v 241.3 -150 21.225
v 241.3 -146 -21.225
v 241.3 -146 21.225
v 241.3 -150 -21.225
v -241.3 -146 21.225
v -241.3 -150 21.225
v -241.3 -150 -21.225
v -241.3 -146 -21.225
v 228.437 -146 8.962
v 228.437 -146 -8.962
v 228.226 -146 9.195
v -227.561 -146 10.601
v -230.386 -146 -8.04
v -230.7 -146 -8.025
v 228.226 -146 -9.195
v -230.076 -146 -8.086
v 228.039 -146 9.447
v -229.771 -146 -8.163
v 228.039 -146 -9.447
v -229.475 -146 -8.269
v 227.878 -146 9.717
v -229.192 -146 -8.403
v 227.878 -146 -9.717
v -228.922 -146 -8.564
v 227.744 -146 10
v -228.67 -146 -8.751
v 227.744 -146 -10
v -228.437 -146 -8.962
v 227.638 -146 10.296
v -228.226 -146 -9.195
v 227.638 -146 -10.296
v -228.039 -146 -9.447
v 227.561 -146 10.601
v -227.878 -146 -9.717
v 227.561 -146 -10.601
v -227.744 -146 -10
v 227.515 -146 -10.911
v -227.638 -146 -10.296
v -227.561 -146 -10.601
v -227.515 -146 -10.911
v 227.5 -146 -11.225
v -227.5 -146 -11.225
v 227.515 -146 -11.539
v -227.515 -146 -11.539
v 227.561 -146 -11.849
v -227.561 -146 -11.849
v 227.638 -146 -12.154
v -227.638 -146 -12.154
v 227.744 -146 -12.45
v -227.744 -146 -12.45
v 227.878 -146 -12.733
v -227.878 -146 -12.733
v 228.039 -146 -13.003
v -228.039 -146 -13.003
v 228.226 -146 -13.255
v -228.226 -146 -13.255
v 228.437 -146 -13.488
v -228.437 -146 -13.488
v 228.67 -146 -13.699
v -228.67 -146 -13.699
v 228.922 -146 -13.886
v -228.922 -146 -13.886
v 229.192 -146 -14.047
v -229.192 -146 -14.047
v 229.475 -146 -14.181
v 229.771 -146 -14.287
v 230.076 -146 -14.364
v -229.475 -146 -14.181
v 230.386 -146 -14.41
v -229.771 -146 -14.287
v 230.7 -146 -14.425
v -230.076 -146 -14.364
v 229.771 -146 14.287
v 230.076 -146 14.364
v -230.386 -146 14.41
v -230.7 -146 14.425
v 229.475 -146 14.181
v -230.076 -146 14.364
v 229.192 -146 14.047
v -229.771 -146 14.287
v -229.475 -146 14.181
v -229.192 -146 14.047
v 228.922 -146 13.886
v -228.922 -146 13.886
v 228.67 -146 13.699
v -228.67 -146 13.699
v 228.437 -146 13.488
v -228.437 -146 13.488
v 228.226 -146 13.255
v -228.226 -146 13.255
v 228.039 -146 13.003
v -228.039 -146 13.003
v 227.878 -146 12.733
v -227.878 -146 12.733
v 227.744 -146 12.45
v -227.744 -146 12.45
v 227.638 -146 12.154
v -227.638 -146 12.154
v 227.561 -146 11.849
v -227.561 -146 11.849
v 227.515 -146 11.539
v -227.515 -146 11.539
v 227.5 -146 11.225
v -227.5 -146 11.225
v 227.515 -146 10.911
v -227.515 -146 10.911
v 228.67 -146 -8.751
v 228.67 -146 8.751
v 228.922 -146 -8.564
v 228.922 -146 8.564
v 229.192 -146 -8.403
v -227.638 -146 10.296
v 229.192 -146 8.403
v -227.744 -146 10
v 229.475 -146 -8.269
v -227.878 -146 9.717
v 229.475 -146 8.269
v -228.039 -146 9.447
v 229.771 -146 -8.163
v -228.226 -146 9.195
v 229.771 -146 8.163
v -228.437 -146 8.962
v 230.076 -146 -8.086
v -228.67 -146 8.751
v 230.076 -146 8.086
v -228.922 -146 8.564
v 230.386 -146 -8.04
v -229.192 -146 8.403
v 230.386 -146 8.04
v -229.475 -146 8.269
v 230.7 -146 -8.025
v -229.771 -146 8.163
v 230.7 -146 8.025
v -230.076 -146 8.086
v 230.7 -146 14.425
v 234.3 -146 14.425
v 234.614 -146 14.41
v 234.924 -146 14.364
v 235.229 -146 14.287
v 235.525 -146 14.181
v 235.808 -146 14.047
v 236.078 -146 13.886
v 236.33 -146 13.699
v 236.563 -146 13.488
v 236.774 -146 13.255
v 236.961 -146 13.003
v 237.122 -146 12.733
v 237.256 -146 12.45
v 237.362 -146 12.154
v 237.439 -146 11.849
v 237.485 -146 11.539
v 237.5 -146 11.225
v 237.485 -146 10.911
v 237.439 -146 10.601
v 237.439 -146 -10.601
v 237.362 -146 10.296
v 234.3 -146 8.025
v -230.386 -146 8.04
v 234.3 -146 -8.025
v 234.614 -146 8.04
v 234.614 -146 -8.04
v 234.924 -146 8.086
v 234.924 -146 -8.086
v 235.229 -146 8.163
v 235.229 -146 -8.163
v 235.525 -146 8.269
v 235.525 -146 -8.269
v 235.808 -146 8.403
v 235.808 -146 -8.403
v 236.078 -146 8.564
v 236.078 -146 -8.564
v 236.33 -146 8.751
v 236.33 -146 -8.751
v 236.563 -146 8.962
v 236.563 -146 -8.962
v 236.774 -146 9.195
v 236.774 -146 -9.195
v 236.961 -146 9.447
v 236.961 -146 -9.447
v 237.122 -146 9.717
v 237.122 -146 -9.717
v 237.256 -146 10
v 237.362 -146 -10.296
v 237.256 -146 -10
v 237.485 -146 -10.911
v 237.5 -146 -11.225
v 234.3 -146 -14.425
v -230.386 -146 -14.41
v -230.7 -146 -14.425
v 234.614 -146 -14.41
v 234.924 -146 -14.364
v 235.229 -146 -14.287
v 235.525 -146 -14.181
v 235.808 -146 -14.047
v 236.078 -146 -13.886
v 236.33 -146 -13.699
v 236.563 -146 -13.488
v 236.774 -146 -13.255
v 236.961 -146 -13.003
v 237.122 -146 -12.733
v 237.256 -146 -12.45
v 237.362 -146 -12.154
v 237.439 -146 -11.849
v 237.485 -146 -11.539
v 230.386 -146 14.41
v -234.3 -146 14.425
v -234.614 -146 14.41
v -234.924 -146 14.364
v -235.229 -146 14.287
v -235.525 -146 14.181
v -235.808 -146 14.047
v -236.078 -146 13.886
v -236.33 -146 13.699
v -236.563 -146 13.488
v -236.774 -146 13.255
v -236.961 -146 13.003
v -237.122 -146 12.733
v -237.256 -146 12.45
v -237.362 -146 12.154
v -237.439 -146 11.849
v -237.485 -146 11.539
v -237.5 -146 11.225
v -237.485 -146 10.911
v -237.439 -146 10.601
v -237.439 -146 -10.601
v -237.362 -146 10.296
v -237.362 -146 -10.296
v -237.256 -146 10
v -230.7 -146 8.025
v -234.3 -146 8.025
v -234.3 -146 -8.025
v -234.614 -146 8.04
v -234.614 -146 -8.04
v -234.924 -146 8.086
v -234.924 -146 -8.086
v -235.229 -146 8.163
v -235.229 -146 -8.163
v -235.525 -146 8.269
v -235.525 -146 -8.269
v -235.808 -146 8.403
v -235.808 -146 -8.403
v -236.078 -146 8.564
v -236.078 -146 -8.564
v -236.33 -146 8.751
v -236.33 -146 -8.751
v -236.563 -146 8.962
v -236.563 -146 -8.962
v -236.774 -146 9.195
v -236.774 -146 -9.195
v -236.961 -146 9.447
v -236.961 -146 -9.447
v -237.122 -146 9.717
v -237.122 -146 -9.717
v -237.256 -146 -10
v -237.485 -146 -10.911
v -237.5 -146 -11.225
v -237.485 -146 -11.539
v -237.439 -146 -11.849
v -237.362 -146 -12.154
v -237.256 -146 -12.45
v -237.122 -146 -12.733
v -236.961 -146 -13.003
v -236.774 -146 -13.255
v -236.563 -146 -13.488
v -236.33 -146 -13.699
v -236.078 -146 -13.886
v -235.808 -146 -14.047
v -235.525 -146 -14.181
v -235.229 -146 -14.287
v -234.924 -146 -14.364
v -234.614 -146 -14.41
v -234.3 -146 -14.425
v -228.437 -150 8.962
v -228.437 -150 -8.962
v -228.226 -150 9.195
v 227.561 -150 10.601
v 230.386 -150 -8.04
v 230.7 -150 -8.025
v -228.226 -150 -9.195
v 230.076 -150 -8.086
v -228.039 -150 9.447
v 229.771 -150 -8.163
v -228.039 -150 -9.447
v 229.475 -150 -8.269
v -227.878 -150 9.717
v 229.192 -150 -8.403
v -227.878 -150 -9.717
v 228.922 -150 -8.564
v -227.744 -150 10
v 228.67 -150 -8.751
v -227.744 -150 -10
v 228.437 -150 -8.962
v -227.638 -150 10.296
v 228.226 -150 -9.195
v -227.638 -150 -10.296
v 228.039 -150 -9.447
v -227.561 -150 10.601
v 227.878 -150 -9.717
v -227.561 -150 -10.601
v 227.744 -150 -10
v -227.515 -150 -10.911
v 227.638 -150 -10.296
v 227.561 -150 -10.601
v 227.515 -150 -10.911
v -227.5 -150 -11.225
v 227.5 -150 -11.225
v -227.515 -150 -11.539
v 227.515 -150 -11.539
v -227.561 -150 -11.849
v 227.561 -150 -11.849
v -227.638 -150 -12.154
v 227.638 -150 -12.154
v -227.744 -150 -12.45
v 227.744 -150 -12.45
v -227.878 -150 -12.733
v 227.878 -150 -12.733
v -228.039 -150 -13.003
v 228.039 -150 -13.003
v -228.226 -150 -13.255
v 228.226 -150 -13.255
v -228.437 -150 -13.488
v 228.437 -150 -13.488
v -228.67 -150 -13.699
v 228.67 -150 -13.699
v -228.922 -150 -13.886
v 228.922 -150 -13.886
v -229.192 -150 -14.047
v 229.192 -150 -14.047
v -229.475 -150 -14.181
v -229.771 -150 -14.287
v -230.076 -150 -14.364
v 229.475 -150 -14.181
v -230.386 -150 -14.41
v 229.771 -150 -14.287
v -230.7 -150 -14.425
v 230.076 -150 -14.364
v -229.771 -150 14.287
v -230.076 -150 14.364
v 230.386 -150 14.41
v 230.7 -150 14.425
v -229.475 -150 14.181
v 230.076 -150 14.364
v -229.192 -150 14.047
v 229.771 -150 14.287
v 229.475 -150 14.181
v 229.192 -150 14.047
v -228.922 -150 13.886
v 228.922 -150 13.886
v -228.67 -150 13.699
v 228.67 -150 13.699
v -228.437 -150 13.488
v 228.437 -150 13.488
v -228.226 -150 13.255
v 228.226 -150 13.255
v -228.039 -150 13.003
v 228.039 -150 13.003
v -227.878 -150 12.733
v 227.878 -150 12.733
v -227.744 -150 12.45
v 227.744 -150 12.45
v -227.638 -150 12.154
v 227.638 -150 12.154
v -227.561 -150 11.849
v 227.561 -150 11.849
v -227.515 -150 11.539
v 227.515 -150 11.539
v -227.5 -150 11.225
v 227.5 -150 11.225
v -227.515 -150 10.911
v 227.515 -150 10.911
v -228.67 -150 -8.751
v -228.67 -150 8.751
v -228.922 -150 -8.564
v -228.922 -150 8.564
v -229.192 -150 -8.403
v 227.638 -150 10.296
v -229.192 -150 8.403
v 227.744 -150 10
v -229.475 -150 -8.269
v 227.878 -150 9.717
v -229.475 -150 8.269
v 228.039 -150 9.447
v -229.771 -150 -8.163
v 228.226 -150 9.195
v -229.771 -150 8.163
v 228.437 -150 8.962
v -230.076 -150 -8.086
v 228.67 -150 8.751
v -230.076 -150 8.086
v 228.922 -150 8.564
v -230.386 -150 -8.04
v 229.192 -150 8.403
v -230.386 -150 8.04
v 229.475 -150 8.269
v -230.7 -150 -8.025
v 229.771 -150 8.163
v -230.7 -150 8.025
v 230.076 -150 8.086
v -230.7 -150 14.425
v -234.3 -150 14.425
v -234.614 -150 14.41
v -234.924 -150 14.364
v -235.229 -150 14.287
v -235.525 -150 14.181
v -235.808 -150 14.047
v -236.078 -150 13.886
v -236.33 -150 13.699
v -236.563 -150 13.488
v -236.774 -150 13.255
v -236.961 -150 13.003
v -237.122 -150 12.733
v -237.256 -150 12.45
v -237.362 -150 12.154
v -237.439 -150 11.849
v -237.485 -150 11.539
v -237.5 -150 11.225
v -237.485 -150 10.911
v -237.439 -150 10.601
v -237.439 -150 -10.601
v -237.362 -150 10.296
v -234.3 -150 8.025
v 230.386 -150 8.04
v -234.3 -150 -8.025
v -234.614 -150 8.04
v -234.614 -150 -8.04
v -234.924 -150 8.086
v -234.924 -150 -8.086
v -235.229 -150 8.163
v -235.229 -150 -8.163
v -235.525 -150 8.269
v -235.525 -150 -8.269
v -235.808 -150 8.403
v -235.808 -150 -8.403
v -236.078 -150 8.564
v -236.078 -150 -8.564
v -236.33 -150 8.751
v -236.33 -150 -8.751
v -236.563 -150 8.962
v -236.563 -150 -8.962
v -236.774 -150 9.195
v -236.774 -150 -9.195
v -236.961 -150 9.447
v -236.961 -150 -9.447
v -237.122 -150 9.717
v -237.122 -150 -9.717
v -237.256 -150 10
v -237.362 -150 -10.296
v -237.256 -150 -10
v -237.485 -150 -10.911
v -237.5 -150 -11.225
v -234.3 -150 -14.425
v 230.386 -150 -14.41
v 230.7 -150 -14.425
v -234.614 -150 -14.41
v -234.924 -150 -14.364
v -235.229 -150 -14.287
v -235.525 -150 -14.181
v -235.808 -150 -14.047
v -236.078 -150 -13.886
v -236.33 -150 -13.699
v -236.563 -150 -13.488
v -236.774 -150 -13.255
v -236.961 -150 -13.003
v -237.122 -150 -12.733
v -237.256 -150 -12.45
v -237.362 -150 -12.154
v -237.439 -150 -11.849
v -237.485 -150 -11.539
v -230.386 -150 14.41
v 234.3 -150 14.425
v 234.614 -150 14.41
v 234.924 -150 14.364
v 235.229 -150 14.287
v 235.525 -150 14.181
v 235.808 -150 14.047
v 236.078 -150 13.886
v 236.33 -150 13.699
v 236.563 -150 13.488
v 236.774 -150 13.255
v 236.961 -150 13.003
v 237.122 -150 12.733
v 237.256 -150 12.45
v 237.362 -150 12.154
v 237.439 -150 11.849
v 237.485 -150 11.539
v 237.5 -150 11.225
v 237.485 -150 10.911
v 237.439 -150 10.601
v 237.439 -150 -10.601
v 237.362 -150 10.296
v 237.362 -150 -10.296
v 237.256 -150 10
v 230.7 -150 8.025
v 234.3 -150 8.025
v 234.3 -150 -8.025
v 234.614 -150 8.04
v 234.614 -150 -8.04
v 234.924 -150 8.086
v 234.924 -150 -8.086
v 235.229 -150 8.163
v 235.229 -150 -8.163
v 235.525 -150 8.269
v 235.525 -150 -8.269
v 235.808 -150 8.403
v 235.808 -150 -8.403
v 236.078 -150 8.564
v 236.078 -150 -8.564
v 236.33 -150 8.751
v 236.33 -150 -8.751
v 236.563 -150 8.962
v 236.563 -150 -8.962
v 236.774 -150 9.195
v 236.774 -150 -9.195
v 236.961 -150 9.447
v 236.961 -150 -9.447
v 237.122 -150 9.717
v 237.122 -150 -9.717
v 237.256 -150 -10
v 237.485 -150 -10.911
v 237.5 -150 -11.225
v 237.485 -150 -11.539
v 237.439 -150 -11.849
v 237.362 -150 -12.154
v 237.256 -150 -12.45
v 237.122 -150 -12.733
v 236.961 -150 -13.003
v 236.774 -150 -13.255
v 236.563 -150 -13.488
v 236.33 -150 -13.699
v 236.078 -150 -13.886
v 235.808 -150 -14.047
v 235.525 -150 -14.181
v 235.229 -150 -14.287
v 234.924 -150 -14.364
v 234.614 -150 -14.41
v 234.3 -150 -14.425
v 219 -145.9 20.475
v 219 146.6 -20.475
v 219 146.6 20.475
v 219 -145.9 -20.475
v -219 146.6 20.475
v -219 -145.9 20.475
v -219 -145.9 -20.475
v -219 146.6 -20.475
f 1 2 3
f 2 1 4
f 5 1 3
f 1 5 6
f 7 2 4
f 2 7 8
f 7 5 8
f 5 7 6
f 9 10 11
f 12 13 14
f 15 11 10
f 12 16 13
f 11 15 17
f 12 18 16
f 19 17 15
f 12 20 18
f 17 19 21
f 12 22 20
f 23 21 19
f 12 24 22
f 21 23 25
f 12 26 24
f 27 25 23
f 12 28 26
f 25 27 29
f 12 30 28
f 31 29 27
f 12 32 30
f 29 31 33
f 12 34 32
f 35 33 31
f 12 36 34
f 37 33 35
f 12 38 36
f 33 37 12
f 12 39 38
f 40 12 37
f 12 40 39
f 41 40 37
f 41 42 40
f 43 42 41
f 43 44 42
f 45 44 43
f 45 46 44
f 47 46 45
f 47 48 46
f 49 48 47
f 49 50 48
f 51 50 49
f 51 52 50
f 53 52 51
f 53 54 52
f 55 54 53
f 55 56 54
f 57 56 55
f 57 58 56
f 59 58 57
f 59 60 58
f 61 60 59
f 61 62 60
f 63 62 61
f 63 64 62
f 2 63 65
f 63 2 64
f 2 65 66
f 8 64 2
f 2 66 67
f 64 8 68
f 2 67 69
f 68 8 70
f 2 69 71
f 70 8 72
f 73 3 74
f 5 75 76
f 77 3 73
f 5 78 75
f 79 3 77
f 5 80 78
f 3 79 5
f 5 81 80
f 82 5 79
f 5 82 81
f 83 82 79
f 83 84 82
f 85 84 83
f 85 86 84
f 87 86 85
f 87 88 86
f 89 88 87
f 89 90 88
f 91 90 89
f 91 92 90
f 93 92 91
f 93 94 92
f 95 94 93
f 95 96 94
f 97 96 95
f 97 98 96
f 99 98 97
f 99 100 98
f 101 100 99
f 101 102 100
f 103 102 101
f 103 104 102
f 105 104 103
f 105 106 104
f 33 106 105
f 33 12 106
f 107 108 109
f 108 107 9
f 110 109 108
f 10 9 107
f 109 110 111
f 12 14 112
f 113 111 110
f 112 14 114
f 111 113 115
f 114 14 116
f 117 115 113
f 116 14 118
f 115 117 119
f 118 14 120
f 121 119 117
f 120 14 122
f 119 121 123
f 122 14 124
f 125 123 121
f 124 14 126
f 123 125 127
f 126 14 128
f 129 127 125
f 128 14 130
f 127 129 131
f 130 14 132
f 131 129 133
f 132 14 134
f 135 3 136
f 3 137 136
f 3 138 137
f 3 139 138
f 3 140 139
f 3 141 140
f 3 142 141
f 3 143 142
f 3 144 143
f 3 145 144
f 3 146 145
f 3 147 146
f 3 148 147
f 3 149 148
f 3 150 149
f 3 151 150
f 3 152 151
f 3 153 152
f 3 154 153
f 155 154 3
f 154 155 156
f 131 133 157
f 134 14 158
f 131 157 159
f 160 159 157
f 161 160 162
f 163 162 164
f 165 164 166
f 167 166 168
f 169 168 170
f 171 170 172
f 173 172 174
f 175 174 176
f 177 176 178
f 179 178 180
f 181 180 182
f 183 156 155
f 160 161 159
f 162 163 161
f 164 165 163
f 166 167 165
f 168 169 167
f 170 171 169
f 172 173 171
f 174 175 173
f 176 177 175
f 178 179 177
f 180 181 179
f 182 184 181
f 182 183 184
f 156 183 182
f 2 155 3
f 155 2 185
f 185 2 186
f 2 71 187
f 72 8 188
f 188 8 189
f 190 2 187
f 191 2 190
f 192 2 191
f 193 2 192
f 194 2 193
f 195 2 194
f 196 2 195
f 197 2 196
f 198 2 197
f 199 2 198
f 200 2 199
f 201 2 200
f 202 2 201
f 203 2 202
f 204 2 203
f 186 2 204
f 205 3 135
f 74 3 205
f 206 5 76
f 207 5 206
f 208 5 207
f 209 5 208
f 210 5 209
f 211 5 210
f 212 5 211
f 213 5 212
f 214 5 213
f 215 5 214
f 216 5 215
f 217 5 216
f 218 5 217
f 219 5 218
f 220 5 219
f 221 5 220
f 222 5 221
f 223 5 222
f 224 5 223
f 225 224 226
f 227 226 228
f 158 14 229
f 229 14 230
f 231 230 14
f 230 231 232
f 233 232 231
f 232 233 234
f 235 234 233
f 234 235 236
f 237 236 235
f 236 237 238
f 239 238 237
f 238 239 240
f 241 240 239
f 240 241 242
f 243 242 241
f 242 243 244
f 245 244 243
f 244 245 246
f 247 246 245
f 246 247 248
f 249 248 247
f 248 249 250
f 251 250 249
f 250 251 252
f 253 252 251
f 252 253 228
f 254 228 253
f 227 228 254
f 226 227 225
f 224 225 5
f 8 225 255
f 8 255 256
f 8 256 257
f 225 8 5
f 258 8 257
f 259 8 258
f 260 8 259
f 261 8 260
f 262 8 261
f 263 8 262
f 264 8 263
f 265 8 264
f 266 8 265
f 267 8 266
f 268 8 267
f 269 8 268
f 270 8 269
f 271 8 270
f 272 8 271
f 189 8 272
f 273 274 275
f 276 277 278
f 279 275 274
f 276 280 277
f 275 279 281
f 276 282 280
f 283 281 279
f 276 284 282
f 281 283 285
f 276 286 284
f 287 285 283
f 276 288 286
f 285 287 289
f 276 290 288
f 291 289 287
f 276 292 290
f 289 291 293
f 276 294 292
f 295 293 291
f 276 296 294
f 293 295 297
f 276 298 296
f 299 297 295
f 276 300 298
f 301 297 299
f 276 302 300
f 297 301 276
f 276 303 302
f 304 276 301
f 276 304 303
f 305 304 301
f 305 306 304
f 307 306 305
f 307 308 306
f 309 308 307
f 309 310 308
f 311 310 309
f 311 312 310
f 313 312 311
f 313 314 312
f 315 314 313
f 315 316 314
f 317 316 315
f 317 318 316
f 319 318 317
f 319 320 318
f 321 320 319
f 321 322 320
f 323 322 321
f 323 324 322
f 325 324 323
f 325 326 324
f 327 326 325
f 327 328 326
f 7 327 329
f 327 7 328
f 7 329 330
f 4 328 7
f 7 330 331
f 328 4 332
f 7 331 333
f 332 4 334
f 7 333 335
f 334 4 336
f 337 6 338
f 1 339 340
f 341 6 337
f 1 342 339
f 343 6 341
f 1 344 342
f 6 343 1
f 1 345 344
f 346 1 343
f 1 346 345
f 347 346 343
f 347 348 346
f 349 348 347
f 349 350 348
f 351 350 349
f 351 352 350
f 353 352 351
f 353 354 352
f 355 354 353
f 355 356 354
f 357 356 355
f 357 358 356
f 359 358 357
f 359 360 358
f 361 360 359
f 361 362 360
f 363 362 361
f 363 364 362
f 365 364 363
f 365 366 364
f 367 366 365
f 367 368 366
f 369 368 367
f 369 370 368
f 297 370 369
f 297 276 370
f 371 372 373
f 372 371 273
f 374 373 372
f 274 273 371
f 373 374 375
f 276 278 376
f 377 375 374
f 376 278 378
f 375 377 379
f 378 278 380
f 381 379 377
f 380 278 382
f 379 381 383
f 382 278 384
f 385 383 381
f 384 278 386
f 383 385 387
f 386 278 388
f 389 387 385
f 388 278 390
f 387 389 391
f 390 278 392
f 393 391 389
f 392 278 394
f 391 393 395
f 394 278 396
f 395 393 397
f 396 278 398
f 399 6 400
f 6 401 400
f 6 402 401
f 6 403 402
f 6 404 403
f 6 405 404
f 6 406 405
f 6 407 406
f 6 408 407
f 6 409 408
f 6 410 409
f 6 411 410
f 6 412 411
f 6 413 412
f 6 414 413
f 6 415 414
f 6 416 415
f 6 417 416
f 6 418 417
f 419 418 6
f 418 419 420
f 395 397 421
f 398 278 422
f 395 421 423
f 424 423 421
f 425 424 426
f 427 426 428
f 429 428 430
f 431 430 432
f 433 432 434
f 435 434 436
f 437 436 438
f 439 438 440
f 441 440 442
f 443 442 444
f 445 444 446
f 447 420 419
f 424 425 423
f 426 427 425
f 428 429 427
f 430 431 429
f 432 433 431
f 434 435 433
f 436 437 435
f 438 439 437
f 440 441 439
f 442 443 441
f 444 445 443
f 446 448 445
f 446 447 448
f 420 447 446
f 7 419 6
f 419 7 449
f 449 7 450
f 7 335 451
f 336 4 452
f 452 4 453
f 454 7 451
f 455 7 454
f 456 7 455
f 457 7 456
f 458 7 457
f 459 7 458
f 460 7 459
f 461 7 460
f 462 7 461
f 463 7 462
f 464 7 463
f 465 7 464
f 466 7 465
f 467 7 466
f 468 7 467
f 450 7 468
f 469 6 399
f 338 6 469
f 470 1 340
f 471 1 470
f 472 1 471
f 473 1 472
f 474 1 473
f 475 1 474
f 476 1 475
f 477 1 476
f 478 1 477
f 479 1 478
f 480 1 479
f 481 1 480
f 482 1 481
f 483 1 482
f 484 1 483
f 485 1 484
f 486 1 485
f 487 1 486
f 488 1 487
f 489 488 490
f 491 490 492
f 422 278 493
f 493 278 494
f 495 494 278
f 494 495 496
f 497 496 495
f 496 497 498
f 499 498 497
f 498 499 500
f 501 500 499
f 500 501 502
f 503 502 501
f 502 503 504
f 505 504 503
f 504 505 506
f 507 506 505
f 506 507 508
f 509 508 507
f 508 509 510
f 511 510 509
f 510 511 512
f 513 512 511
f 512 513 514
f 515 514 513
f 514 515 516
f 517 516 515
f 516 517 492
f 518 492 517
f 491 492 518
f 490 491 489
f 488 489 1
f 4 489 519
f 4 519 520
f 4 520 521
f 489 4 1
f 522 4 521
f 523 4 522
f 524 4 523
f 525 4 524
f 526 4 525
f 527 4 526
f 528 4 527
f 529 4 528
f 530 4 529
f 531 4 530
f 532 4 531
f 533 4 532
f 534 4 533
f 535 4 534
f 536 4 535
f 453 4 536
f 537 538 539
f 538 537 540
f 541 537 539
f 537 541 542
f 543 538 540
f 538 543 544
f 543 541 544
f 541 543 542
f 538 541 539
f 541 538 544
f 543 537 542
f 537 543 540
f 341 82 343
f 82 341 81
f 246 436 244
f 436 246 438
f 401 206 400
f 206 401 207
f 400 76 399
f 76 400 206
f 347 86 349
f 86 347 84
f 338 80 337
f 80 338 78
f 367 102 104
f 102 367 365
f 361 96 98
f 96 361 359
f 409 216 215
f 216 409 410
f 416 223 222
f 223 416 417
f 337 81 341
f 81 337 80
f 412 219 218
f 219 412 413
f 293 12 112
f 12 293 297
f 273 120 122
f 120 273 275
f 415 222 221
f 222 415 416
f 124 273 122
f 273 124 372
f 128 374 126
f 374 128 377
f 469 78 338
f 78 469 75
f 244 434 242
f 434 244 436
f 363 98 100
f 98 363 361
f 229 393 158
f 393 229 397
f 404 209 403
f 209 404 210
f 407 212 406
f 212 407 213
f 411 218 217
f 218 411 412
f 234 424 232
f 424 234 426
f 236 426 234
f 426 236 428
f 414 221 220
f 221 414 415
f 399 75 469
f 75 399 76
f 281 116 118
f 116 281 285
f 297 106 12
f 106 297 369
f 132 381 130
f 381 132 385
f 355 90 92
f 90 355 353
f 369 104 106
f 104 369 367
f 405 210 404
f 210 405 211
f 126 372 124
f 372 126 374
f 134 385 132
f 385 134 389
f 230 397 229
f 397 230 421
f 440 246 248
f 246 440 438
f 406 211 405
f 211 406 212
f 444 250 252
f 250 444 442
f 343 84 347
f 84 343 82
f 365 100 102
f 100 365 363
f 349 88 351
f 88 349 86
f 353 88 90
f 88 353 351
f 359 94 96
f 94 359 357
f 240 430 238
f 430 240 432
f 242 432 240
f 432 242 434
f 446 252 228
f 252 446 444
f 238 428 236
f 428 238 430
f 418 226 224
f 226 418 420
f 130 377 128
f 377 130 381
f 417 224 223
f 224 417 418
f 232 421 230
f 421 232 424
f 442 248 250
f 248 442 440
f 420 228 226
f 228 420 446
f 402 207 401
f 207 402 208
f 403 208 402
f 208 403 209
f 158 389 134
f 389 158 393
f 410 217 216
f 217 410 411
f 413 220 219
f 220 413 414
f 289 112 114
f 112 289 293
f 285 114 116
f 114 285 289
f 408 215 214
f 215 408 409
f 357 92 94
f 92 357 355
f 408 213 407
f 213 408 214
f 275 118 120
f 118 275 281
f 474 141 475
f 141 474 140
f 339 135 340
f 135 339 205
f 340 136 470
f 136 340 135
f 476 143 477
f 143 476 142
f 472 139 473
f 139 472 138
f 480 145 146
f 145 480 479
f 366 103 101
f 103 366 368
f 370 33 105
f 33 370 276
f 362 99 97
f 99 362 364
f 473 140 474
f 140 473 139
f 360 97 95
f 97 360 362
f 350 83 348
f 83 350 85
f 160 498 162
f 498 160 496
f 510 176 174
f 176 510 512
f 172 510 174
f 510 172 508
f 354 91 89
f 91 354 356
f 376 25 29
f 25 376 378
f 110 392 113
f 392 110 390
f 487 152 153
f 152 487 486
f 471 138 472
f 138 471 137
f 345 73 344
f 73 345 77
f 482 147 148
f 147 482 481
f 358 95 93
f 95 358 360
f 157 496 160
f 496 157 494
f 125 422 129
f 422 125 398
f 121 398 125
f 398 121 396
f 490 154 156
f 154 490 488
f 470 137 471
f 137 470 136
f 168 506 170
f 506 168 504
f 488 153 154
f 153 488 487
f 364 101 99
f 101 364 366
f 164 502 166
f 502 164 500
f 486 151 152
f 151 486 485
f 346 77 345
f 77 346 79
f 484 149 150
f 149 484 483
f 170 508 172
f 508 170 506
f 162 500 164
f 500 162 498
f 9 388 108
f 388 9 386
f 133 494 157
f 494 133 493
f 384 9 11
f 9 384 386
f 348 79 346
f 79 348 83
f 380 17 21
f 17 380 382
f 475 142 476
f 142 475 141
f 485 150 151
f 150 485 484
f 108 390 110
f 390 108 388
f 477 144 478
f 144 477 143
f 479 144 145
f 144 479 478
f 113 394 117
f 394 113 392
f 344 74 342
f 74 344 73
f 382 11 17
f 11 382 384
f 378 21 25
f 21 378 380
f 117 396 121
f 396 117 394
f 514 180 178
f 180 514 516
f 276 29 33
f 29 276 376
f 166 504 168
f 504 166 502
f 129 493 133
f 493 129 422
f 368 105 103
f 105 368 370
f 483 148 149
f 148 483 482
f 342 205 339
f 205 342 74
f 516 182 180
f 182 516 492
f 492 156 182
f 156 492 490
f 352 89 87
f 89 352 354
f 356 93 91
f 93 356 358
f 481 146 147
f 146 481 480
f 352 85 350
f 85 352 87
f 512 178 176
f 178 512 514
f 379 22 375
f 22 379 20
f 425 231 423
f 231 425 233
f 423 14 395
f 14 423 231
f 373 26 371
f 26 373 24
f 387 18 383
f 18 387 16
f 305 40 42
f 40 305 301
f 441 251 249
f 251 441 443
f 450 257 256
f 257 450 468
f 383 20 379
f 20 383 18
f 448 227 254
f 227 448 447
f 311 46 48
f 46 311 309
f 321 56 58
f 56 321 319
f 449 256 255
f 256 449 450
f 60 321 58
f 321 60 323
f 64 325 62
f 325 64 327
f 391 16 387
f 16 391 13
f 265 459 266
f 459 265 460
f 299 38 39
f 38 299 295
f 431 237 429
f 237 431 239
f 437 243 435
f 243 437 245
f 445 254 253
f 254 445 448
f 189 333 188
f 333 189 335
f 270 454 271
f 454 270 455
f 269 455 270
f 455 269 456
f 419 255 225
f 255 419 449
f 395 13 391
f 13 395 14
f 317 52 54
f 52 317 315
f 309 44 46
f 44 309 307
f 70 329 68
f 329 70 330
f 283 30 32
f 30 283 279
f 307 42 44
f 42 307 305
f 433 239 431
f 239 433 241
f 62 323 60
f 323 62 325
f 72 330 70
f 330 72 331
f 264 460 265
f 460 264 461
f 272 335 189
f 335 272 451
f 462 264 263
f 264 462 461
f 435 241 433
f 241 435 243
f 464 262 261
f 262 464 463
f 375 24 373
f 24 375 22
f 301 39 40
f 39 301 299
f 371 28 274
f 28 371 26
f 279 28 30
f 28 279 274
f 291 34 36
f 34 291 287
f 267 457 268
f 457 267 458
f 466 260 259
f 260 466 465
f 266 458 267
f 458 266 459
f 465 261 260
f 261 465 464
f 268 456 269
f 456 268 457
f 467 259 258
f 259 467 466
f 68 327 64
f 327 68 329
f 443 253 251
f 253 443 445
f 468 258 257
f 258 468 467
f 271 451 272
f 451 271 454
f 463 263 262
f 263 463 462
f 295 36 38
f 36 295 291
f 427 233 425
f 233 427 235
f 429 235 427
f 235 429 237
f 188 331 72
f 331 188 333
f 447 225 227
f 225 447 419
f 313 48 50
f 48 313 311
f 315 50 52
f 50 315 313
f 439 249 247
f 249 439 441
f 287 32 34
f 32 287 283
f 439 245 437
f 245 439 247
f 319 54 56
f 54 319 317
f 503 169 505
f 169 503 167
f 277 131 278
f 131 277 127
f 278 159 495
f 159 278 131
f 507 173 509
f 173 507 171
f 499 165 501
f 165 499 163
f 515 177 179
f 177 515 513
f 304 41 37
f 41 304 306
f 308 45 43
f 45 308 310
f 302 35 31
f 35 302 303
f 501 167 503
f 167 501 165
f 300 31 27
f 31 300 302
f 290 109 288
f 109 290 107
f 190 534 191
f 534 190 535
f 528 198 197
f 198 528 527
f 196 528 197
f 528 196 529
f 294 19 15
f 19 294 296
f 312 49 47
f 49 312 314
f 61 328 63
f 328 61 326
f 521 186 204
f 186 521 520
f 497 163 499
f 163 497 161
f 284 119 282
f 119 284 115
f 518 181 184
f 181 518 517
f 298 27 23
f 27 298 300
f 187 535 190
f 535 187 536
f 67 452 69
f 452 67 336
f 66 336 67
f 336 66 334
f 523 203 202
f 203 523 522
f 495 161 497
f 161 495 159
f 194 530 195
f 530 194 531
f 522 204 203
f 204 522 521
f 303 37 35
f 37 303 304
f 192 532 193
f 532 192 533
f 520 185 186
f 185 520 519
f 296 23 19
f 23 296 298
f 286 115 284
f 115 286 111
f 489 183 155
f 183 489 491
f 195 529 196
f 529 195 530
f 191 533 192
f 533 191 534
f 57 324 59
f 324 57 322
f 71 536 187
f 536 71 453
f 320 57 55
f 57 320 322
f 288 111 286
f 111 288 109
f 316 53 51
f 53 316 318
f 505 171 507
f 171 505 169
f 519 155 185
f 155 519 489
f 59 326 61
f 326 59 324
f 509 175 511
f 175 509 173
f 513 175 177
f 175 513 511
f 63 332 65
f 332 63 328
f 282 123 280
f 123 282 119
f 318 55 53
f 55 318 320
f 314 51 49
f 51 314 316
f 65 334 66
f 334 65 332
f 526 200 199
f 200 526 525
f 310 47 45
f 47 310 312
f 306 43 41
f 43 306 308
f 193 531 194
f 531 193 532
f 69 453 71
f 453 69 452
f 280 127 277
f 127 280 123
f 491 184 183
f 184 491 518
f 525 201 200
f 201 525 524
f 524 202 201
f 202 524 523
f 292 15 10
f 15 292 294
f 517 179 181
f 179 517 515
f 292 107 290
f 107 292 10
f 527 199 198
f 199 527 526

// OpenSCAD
// ============================================================================
// Atom Lithography Machine — Parametric OpenSCAD Module (S3.3-02)
// ============================================================================
// part_id           : S3.3-02
// parent_bom_id     : S3.3
// subsystem         : S3
// part_name         : Yuksek hizli LVDS / optik galvanik izole blanker geri-besleme hatti
// material          : Al 6061
// temp_stage        : 300 K
// vacuum_grade      : Atmosfer
// tolerance         : Jitter <1 ns
// computed_mass_kg  : 2.44621
// envelope_mm       : 482.600 x 333.000 x 42.450
// design_maturity   : M0_M1_DETAILED_CAD_DESIGN_ONLY
// no_lab_measurement: true
// iec61508_certified: false
// semi_s2_certified : false
// Units: millimeters (mm)
// ============================================================================

$fn = 64;

// Nominal bounding envelope parameters (mm)
bbox_x = 482.6000;
bbox_y = 333.0000;
bbox_z = 42.4500;

// Part-specific parametric dimensions
n_optical_ports = 16;
rack_u_height = 1;
depth_mm = 300.0;

// Interface / port parameters (mm)

module part_S3_3_02() {
  difference() {
    union() {
      // 19-inch EIA-310 1U front faceplate (482.6 x 42.5 mm, facing -Y)
      translate([0.000, -148.000, 0.000]) cube([482.600, 4.000, 42.450], center=true);
      // Hollow EMI-shielded chassis body
      translate([0.000, 0.350, 0.000]) cube([438.000, 292.500, 40.950], center=true);
    }
    // EIA-310 upper-left rack ear slot
    translate([-232.500, -148.000, 11.225]) rotate([90.000, 0.000, 0.000]) {
      hull() {
        translate([-1.800, 0, 0]) cylinder(d=6.400, h=8.000, center=true);
        translate([1.800, 0, 0]) cylinder(d=6.400, h=8.000, center=true);
      }
    }
    // EIA-310 upper-right rack ear slot
    translate([232.500, -148.000, 11.225]) rotate([90.000, 0.000, 0.000]) {
      hull() {
        translate([-1.800, 0, 0]) cylinder(d=6.400, h=8.000, center=true);
        translate([1.800, 0, 0]) cylinder(d=6.400, h=8.000, center=true);
      }
    }
    // EIA-310 lower-left rack ear slot
    translate([-232.500, -148.000, -11.225]) rotate([90.000, 0.000, 0.000]) {
      hull() {
        translate([-1.800, 0, 0]) cylinder(d=6.400, h=8.000, center=true);
        translate([1.800, 0, 0]) cylinder(d=6.400, h=8.000, center=true);
      }
    }
    // EIA-310 lower-right rack ear slot
    translate([232.500, -148.000, -11.225]) rotate([90.000, 0.000, 0.000]) {
      hull() {
        translate([-1.800, 0, 0]) cylinder(d=6.400, h=8.000, center=true);
        translate([1.800, 0, 0]) cylinder(d=6.400, h=8.000, center=true);
      }
    }
  }
}

// World assembly mounting transform (global machine frame, mm / deg):
// translate([1480.000, -260.000, 723.475]) rotate([0.000, 0.000, 0.000]) part_S3_3_02();

part_S3_3_02();
